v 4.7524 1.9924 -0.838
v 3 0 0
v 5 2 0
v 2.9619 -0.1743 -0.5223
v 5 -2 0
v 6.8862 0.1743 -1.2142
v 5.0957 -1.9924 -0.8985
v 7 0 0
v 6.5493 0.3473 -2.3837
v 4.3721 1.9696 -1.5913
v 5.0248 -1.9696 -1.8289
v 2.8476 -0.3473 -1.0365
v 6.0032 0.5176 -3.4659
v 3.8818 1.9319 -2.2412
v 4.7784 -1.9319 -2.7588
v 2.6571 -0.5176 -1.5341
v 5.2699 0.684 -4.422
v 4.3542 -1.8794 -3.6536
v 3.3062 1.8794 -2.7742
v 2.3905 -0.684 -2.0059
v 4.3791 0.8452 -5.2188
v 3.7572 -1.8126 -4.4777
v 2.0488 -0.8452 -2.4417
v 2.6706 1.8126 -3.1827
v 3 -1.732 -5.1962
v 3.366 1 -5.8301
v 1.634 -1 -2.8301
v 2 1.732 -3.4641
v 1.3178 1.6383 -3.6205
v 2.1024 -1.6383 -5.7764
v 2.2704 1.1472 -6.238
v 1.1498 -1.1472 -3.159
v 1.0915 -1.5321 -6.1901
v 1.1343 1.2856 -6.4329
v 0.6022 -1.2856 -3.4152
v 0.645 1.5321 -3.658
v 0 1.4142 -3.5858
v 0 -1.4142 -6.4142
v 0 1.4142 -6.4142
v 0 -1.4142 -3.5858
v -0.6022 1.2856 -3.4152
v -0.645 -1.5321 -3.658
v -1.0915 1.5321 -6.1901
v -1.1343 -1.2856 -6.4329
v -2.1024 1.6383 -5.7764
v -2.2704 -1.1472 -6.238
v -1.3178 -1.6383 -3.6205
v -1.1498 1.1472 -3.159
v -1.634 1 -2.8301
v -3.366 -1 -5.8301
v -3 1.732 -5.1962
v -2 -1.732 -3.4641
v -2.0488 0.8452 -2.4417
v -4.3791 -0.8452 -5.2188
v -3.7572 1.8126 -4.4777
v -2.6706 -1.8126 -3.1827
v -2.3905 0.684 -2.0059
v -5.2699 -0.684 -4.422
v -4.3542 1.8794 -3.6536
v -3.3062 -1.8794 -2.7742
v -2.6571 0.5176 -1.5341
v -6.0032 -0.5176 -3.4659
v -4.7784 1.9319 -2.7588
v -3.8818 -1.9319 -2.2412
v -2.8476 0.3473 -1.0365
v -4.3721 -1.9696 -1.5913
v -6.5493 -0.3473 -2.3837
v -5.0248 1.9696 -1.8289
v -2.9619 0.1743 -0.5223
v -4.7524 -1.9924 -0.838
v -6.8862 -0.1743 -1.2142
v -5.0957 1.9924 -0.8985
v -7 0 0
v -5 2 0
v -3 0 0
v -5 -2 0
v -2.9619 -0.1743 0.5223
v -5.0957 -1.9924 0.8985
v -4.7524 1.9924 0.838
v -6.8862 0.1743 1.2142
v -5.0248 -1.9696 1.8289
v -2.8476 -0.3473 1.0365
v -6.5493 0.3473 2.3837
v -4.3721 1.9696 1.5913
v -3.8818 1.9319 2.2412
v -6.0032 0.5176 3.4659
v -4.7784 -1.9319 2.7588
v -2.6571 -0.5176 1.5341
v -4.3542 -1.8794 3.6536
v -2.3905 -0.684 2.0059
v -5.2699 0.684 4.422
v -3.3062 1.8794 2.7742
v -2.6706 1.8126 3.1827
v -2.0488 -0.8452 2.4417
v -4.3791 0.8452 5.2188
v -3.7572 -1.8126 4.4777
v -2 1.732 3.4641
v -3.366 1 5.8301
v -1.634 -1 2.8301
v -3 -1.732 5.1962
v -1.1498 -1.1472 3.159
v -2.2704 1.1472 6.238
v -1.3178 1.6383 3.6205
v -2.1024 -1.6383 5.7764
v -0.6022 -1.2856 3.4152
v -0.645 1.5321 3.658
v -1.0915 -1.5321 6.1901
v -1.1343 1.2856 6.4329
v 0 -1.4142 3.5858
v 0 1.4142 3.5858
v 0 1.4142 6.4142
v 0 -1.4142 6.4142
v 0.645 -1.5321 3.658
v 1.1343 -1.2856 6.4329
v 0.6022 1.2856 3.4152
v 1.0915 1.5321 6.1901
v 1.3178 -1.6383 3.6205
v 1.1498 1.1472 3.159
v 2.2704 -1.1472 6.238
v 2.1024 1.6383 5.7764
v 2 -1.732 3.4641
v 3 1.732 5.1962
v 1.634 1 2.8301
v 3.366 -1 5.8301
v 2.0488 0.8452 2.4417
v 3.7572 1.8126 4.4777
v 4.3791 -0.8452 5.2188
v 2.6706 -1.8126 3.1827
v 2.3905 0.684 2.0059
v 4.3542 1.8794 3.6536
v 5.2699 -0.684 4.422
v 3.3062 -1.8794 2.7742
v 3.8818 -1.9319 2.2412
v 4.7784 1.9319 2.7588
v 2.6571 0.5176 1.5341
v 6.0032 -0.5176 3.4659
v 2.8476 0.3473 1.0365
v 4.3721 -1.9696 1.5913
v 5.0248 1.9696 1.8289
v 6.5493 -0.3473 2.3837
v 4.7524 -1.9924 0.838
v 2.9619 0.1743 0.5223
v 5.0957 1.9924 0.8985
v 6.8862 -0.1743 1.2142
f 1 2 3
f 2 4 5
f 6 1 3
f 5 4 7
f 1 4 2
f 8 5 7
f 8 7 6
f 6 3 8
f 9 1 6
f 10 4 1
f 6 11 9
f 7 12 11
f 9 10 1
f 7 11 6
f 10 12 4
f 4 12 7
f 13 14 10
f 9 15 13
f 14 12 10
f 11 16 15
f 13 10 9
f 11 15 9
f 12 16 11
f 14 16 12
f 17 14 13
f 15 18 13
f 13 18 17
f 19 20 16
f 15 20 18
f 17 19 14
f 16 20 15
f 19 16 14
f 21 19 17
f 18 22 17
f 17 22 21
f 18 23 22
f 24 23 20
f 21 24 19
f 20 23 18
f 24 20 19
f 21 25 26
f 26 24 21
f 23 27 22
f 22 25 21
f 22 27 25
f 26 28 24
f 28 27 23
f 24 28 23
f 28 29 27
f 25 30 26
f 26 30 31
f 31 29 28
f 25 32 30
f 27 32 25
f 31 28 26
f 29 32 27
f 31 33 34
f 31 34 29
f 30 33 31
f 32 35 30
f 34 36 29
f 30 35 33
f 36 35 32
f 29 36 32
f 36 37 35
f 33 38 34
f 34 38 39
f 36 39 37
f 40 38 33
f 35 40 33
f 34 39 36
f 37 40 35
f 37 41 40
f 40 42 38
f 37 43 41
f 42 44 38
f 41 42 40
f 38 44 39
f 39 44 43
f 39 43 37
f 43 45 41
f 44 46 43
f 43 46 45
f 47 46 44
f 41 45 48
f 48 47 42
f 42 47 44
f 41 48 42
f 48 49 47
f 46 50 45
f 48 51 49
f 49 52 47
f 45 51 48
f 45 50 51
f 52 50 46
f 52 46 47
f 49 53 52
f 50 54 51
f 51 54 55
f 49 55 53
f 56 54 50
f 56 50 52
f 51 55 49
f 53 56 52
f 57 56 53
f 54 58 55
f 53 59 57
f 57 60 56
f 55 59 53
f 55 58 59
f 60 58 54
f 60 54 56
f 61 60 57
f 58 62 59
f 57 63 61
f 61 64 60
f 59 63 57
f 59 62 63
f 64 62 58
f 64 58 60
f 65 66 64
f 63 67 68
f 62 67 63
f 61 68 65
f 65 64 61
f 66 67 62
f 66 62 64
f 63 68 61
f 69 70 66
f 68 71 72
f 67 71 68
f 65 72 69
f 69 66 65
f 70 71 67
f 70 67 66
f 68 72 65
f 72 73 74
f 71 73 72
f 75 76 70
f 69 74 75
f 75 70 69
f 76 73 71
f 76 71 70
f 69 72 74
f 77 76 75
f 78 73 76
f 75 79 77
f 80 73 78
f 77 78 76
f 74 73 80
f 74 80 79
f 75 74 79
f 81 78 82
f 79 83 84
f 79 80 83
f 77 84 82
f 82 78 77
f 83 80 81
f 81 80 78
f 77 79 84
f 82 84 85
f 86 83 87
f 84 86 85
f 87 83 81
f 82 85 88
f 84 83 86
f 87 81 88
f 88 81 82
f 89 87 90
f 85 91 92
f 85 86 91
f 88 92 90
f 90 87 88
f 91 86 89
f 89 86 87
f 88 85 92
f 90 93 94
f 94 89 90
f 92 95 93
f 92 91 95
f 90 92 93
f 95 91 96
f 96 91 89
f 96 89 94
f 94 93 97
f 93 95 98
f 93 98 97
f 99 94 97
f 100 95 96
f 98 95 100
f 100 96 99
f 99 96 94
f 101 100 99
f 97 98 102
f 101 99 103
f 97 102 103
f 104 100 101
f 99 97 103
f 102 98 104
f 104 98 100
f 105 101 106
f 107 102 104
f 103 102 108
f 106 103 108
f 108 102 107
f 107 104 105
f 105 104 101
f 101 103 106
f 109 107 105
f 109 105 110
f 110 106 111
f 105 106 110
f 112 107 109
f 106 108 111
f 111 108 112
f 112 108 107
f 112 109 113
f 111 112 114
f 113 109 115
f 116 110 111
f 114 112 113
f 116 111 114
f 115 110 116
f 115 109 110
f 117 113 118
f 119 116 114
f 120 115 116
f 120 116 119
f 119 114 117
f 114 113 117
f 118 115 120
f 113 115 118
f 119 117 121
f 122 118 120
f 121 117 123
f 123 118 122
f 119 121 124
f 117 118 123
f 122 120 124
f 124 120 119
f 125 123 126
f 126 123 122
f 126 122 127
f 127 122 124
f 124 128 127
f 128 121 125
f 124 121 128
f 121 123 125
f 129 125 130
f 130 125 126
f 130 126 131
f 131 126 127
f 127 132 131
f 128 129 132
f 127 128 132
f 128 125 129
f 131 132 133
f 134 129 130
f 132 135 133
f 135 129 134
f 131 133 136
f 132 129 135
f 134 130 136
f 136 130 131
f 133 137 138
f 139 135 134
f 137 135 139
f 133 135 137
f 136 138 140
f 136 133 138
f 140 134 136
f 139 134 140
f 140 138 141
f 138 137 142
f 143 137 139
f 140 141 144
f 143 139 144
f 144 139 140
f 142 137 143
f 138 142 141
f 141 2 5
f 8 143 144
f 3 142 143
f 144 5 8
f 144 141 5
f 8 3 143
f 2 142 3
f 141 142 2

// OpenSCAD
//!OpenSCAD




Nombre_de_faces = 4;
Taille = 5;
Qualite = 10;
Nombre_de_tours = 2;
// chain hull
for (i = [0 : abs(Qualite) : 360 - Qualite]) {
  hull() {
  rotate([0, i, 0]){
    translate([Taille, 0, 0]){
      rotate([0, 0, ((i * Nombre_de_tours) / Nombre_de_faces)]){
        // torus
        rotate_extrude($fn=Nombre_de_faces) {
          translate([1, 0, 0]) {
            circle(r=1, $fn=4);
          }
        }
      }
    }
  }
  rotate([0, (i + Qualite), 0]){
    translate([Taille, 0, 0]){
      rotate([0, 0, (((i + Qualite) * Nombre_de_tours) / Nombre_de_faces)]){
        // torus
        rotate_extrude($fn=Nombre_de_faces) {
          translate([1, 0, 0]) {
            circle(r=1, $fn=4);
          }
        }
      }
    }
  }
  }
}
